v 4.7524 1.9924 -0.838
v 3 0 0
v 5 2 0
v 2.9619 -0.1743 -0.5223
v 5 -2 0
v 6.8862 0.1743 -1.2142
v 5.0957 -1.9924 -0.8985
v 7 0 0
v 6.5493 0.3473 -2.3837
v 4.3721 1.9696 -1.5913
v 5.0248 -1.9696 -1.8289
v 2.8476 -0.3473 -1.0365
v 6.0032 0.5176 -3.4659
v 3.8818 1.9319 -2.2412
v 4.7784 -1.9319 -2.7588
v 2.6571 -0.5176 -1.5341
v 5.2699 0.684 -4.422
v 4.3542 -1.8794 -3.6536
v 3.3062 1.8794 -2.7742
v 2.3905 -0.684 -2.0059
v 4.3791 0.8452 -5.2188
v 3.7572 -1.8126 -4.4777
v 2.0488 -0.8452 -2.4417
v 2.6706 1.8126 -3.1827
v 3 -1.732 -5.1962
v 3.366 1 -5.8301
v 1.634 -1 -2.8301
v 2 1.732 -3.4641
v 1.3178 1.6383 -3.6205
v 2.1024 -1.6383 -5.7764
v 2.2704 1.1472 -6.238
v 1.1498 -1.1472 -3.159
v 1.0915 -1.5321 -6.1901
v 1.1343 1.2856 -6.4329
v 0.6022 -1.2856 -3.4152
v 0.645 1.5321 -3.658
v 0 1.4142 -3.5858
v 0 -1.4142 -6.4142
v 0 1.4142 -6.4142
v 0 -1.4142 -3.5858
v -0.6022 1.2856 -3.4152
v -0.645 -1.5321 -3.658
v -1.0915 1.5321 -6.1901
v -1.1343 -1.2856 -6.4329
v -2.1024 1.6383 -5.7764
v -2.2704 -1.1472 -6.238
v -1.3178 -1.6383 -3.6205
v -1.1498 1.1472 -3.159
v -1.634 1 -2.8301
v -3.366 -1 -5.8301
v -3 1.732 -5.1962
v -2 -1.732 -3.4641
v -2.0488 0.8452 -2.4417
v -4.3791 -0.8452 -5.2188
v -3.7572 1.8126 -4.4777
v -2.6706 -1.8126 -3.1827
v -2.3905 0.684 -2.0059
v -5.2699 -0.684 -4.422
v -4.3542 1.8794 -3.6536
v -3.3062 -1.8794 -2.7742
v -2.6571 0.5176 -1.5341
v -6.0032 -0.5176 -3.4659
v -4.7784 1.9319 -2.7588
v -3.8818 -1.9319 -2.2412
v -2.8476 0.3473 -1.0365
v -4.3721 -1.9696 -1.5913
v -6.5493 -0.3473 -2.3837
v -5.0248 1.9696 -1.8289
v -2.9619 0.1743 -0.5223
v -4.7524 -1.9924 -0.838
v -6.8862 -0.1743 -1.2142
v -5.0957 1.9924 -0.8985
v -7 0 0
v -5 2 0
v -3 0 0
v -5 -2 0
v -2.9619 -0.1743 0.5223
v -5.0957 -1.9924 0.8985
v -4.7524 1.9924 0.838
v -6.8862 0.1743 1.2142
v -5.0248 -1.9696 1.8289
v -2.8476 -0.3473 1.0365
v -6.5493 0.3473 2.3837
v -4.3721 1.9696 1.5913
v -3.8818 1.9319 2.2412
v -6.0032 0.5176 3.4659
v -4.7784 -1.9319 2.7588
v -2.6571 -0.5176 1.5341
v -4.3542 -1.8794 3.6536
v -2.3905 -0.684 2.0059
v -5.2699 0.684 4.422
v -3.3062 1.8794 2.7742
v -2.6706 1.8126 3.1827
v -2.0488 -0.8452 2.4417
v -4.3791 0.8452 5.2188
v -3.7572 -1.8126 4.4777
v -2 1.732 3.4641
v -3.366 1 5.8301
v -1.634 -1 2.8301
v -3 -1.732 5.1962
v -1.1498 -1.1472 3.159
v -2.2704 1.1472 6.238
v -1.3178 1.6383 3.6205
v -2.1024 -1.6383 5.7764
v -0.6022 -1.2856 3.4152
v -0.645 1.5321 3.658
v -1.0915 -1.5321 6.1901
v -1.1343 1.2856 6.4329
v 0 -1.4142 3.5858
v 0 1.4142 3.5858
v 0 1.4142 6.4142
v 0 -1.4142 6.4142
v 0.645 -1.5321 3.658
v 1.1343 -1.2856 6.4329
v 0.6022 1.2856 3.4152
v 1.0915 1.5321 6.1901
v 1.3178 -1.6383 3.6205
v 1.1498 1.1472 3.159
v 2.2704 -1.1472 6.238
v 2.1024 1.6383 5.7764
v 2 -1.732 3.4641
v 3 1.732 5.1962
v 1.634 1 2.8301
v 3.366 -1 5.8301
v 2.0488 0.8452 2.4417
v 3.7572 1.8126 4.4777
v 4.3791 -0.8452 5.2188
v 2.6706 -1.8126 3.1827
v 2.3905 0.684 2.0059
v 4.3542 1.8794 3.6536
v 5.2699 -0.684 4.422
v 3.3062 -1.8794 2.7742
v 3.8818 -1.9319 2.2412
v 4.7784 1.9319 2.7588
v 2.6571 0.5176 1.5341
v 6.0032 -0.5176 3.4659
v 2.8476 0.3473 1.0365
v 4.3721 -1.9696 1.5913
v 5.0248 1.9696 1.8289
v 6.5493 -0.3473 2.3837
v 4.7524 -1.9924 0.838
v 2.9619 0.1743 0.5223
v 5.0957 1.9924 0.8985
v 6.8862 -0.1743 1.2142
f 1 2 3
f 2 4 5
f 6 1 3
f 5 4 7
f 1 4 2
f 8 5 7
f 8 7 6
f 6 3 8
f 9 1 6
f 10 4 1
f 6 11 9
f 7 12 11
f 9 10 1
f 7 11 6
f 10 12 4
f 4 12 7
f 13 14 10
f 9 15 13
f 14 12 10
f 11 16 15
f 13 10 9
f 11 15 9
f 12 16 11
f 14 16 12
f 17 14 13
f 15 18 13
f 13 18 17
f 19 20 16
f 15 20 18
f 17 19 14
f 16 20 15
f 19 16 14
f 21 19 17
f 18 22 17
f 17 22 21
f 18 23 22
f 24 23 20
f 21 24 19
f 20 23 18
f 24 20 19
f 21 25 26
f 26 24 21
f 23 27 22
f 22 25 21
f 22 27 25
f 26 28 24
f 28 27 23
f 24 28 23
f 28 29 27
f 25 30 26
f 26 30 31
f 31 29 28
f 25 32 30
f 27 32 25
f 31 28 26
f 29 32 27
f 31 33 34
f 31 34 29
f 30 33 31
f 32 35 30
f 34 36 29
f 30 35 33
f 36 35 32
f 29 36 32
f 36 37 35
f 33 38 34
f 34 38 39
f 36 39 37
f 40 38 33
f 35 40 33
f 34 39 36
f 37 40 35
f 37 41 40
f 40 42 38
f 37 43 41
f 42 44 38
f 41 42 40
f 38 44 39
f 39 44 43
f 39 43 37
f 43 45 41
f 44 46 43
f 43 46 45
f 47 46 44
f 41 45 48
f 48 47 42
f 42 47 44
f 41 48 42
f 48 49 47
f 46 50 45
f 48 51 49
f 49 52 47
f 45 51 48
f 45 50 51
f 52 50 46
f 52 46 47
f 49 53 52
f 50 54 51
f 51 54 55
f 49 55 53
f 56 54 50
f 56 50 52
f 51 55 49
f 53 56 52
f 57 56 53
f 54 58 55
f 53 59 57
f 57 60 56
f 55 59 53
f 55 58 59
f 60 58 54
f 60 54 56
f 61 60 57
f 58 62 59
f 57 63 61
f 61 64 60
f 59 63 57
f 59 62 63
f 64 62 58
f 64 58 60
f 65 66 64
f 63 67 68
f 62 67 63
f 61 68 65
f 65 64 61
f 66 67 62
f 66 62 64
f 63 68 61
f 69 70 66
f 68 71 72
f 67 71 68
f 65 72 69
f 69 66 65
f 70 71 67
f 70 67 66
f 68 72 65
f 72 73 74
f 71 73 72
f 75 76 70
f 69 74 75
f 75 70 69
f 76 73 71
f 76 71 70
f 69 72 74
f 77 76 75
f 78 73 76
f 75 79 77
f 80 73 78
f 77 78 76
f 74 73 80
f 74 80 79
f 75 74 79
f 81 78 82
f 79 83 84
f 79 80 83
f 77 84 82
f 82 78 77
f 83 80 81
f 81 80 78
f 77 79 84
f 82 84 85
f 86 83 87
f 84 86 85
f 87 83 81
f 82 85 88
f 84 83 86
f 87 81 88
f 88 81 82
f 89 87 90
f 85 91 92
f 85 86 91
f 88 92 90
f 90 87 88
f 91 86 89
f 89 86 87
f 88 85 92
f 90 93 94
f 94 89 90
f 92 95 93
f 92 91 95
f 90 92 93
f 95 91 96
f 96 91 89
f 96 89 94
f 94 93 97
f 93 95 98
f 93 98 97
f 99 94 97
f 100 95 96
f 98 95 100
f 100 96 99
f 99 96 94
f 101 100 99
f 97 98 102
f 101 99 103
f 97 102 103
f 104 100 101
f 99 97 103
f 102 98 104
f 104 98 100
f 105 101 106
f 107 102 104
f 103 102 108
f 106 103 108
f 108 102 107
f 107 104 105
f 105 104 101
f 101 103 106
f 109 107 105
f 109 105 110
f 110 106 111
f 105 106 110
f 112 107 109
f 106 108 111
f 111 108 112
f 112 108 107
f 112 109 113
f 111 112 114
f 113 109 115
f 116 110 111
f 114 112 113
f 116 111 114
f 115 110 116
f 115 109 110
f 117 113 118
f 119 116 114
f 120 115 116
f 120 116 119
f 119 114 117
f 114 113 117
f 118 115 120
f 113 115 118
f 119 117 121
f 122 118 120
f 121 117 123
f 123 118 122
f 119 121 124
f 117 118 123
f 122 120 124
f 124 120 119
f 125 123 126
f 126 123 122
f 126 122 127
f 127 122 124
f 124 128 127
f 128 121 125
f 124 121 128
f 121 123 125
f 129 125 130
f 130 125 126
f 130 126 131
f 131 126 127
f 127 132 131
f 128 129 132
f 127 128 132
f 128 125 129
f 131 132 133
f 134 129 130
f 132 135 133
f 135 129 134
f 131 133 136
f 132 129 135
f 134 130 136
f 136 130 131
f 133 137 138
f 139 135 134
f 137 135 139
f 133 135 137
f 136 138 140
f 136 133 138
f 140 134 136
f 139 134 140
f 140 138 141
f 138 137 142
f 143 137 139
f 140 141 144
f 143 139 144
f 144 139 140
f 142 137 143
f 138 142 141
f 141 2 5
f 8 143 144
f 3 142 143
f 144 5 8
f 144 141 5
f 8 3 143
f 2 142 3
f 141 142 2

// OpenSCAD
//!OpenSCAD




Nombre_de_faces = 4;
Taille = 5;
Qualite = 10;
Nombre_de_tours = 2;
// chain hull
for (i = [0 : abs(Qualite) : 360 - Qualite]) {
  hull() {
  rotate([0, i, 0]){
    translate([Taille, 0, 0]){
      rotate([0, 0, ((i * Nombre_de_tours) / Nombre_de_faces)]){
        // torus
        rotate_extrude($fn=Nombre_de_faces) {
          translate([1, 0, 0]) {
            circle(r=1, $fn=4);
          }
        }
      }
    }
  }
  rotate([0, (i + Qualite), 0]){
    translate([Taille, 0, 0]){
      rotate([0, 0, (((i + Qualite) * Nombre_de_tours) / Nombre_de_faces)]){
        // torus
        rotate_extrude($fn=Nombre_de_faces) {
          translate([1, 0, 0]) {
            circle(r=1, $fn=4);
          }
        }
      }
    }
  }
  }
}
